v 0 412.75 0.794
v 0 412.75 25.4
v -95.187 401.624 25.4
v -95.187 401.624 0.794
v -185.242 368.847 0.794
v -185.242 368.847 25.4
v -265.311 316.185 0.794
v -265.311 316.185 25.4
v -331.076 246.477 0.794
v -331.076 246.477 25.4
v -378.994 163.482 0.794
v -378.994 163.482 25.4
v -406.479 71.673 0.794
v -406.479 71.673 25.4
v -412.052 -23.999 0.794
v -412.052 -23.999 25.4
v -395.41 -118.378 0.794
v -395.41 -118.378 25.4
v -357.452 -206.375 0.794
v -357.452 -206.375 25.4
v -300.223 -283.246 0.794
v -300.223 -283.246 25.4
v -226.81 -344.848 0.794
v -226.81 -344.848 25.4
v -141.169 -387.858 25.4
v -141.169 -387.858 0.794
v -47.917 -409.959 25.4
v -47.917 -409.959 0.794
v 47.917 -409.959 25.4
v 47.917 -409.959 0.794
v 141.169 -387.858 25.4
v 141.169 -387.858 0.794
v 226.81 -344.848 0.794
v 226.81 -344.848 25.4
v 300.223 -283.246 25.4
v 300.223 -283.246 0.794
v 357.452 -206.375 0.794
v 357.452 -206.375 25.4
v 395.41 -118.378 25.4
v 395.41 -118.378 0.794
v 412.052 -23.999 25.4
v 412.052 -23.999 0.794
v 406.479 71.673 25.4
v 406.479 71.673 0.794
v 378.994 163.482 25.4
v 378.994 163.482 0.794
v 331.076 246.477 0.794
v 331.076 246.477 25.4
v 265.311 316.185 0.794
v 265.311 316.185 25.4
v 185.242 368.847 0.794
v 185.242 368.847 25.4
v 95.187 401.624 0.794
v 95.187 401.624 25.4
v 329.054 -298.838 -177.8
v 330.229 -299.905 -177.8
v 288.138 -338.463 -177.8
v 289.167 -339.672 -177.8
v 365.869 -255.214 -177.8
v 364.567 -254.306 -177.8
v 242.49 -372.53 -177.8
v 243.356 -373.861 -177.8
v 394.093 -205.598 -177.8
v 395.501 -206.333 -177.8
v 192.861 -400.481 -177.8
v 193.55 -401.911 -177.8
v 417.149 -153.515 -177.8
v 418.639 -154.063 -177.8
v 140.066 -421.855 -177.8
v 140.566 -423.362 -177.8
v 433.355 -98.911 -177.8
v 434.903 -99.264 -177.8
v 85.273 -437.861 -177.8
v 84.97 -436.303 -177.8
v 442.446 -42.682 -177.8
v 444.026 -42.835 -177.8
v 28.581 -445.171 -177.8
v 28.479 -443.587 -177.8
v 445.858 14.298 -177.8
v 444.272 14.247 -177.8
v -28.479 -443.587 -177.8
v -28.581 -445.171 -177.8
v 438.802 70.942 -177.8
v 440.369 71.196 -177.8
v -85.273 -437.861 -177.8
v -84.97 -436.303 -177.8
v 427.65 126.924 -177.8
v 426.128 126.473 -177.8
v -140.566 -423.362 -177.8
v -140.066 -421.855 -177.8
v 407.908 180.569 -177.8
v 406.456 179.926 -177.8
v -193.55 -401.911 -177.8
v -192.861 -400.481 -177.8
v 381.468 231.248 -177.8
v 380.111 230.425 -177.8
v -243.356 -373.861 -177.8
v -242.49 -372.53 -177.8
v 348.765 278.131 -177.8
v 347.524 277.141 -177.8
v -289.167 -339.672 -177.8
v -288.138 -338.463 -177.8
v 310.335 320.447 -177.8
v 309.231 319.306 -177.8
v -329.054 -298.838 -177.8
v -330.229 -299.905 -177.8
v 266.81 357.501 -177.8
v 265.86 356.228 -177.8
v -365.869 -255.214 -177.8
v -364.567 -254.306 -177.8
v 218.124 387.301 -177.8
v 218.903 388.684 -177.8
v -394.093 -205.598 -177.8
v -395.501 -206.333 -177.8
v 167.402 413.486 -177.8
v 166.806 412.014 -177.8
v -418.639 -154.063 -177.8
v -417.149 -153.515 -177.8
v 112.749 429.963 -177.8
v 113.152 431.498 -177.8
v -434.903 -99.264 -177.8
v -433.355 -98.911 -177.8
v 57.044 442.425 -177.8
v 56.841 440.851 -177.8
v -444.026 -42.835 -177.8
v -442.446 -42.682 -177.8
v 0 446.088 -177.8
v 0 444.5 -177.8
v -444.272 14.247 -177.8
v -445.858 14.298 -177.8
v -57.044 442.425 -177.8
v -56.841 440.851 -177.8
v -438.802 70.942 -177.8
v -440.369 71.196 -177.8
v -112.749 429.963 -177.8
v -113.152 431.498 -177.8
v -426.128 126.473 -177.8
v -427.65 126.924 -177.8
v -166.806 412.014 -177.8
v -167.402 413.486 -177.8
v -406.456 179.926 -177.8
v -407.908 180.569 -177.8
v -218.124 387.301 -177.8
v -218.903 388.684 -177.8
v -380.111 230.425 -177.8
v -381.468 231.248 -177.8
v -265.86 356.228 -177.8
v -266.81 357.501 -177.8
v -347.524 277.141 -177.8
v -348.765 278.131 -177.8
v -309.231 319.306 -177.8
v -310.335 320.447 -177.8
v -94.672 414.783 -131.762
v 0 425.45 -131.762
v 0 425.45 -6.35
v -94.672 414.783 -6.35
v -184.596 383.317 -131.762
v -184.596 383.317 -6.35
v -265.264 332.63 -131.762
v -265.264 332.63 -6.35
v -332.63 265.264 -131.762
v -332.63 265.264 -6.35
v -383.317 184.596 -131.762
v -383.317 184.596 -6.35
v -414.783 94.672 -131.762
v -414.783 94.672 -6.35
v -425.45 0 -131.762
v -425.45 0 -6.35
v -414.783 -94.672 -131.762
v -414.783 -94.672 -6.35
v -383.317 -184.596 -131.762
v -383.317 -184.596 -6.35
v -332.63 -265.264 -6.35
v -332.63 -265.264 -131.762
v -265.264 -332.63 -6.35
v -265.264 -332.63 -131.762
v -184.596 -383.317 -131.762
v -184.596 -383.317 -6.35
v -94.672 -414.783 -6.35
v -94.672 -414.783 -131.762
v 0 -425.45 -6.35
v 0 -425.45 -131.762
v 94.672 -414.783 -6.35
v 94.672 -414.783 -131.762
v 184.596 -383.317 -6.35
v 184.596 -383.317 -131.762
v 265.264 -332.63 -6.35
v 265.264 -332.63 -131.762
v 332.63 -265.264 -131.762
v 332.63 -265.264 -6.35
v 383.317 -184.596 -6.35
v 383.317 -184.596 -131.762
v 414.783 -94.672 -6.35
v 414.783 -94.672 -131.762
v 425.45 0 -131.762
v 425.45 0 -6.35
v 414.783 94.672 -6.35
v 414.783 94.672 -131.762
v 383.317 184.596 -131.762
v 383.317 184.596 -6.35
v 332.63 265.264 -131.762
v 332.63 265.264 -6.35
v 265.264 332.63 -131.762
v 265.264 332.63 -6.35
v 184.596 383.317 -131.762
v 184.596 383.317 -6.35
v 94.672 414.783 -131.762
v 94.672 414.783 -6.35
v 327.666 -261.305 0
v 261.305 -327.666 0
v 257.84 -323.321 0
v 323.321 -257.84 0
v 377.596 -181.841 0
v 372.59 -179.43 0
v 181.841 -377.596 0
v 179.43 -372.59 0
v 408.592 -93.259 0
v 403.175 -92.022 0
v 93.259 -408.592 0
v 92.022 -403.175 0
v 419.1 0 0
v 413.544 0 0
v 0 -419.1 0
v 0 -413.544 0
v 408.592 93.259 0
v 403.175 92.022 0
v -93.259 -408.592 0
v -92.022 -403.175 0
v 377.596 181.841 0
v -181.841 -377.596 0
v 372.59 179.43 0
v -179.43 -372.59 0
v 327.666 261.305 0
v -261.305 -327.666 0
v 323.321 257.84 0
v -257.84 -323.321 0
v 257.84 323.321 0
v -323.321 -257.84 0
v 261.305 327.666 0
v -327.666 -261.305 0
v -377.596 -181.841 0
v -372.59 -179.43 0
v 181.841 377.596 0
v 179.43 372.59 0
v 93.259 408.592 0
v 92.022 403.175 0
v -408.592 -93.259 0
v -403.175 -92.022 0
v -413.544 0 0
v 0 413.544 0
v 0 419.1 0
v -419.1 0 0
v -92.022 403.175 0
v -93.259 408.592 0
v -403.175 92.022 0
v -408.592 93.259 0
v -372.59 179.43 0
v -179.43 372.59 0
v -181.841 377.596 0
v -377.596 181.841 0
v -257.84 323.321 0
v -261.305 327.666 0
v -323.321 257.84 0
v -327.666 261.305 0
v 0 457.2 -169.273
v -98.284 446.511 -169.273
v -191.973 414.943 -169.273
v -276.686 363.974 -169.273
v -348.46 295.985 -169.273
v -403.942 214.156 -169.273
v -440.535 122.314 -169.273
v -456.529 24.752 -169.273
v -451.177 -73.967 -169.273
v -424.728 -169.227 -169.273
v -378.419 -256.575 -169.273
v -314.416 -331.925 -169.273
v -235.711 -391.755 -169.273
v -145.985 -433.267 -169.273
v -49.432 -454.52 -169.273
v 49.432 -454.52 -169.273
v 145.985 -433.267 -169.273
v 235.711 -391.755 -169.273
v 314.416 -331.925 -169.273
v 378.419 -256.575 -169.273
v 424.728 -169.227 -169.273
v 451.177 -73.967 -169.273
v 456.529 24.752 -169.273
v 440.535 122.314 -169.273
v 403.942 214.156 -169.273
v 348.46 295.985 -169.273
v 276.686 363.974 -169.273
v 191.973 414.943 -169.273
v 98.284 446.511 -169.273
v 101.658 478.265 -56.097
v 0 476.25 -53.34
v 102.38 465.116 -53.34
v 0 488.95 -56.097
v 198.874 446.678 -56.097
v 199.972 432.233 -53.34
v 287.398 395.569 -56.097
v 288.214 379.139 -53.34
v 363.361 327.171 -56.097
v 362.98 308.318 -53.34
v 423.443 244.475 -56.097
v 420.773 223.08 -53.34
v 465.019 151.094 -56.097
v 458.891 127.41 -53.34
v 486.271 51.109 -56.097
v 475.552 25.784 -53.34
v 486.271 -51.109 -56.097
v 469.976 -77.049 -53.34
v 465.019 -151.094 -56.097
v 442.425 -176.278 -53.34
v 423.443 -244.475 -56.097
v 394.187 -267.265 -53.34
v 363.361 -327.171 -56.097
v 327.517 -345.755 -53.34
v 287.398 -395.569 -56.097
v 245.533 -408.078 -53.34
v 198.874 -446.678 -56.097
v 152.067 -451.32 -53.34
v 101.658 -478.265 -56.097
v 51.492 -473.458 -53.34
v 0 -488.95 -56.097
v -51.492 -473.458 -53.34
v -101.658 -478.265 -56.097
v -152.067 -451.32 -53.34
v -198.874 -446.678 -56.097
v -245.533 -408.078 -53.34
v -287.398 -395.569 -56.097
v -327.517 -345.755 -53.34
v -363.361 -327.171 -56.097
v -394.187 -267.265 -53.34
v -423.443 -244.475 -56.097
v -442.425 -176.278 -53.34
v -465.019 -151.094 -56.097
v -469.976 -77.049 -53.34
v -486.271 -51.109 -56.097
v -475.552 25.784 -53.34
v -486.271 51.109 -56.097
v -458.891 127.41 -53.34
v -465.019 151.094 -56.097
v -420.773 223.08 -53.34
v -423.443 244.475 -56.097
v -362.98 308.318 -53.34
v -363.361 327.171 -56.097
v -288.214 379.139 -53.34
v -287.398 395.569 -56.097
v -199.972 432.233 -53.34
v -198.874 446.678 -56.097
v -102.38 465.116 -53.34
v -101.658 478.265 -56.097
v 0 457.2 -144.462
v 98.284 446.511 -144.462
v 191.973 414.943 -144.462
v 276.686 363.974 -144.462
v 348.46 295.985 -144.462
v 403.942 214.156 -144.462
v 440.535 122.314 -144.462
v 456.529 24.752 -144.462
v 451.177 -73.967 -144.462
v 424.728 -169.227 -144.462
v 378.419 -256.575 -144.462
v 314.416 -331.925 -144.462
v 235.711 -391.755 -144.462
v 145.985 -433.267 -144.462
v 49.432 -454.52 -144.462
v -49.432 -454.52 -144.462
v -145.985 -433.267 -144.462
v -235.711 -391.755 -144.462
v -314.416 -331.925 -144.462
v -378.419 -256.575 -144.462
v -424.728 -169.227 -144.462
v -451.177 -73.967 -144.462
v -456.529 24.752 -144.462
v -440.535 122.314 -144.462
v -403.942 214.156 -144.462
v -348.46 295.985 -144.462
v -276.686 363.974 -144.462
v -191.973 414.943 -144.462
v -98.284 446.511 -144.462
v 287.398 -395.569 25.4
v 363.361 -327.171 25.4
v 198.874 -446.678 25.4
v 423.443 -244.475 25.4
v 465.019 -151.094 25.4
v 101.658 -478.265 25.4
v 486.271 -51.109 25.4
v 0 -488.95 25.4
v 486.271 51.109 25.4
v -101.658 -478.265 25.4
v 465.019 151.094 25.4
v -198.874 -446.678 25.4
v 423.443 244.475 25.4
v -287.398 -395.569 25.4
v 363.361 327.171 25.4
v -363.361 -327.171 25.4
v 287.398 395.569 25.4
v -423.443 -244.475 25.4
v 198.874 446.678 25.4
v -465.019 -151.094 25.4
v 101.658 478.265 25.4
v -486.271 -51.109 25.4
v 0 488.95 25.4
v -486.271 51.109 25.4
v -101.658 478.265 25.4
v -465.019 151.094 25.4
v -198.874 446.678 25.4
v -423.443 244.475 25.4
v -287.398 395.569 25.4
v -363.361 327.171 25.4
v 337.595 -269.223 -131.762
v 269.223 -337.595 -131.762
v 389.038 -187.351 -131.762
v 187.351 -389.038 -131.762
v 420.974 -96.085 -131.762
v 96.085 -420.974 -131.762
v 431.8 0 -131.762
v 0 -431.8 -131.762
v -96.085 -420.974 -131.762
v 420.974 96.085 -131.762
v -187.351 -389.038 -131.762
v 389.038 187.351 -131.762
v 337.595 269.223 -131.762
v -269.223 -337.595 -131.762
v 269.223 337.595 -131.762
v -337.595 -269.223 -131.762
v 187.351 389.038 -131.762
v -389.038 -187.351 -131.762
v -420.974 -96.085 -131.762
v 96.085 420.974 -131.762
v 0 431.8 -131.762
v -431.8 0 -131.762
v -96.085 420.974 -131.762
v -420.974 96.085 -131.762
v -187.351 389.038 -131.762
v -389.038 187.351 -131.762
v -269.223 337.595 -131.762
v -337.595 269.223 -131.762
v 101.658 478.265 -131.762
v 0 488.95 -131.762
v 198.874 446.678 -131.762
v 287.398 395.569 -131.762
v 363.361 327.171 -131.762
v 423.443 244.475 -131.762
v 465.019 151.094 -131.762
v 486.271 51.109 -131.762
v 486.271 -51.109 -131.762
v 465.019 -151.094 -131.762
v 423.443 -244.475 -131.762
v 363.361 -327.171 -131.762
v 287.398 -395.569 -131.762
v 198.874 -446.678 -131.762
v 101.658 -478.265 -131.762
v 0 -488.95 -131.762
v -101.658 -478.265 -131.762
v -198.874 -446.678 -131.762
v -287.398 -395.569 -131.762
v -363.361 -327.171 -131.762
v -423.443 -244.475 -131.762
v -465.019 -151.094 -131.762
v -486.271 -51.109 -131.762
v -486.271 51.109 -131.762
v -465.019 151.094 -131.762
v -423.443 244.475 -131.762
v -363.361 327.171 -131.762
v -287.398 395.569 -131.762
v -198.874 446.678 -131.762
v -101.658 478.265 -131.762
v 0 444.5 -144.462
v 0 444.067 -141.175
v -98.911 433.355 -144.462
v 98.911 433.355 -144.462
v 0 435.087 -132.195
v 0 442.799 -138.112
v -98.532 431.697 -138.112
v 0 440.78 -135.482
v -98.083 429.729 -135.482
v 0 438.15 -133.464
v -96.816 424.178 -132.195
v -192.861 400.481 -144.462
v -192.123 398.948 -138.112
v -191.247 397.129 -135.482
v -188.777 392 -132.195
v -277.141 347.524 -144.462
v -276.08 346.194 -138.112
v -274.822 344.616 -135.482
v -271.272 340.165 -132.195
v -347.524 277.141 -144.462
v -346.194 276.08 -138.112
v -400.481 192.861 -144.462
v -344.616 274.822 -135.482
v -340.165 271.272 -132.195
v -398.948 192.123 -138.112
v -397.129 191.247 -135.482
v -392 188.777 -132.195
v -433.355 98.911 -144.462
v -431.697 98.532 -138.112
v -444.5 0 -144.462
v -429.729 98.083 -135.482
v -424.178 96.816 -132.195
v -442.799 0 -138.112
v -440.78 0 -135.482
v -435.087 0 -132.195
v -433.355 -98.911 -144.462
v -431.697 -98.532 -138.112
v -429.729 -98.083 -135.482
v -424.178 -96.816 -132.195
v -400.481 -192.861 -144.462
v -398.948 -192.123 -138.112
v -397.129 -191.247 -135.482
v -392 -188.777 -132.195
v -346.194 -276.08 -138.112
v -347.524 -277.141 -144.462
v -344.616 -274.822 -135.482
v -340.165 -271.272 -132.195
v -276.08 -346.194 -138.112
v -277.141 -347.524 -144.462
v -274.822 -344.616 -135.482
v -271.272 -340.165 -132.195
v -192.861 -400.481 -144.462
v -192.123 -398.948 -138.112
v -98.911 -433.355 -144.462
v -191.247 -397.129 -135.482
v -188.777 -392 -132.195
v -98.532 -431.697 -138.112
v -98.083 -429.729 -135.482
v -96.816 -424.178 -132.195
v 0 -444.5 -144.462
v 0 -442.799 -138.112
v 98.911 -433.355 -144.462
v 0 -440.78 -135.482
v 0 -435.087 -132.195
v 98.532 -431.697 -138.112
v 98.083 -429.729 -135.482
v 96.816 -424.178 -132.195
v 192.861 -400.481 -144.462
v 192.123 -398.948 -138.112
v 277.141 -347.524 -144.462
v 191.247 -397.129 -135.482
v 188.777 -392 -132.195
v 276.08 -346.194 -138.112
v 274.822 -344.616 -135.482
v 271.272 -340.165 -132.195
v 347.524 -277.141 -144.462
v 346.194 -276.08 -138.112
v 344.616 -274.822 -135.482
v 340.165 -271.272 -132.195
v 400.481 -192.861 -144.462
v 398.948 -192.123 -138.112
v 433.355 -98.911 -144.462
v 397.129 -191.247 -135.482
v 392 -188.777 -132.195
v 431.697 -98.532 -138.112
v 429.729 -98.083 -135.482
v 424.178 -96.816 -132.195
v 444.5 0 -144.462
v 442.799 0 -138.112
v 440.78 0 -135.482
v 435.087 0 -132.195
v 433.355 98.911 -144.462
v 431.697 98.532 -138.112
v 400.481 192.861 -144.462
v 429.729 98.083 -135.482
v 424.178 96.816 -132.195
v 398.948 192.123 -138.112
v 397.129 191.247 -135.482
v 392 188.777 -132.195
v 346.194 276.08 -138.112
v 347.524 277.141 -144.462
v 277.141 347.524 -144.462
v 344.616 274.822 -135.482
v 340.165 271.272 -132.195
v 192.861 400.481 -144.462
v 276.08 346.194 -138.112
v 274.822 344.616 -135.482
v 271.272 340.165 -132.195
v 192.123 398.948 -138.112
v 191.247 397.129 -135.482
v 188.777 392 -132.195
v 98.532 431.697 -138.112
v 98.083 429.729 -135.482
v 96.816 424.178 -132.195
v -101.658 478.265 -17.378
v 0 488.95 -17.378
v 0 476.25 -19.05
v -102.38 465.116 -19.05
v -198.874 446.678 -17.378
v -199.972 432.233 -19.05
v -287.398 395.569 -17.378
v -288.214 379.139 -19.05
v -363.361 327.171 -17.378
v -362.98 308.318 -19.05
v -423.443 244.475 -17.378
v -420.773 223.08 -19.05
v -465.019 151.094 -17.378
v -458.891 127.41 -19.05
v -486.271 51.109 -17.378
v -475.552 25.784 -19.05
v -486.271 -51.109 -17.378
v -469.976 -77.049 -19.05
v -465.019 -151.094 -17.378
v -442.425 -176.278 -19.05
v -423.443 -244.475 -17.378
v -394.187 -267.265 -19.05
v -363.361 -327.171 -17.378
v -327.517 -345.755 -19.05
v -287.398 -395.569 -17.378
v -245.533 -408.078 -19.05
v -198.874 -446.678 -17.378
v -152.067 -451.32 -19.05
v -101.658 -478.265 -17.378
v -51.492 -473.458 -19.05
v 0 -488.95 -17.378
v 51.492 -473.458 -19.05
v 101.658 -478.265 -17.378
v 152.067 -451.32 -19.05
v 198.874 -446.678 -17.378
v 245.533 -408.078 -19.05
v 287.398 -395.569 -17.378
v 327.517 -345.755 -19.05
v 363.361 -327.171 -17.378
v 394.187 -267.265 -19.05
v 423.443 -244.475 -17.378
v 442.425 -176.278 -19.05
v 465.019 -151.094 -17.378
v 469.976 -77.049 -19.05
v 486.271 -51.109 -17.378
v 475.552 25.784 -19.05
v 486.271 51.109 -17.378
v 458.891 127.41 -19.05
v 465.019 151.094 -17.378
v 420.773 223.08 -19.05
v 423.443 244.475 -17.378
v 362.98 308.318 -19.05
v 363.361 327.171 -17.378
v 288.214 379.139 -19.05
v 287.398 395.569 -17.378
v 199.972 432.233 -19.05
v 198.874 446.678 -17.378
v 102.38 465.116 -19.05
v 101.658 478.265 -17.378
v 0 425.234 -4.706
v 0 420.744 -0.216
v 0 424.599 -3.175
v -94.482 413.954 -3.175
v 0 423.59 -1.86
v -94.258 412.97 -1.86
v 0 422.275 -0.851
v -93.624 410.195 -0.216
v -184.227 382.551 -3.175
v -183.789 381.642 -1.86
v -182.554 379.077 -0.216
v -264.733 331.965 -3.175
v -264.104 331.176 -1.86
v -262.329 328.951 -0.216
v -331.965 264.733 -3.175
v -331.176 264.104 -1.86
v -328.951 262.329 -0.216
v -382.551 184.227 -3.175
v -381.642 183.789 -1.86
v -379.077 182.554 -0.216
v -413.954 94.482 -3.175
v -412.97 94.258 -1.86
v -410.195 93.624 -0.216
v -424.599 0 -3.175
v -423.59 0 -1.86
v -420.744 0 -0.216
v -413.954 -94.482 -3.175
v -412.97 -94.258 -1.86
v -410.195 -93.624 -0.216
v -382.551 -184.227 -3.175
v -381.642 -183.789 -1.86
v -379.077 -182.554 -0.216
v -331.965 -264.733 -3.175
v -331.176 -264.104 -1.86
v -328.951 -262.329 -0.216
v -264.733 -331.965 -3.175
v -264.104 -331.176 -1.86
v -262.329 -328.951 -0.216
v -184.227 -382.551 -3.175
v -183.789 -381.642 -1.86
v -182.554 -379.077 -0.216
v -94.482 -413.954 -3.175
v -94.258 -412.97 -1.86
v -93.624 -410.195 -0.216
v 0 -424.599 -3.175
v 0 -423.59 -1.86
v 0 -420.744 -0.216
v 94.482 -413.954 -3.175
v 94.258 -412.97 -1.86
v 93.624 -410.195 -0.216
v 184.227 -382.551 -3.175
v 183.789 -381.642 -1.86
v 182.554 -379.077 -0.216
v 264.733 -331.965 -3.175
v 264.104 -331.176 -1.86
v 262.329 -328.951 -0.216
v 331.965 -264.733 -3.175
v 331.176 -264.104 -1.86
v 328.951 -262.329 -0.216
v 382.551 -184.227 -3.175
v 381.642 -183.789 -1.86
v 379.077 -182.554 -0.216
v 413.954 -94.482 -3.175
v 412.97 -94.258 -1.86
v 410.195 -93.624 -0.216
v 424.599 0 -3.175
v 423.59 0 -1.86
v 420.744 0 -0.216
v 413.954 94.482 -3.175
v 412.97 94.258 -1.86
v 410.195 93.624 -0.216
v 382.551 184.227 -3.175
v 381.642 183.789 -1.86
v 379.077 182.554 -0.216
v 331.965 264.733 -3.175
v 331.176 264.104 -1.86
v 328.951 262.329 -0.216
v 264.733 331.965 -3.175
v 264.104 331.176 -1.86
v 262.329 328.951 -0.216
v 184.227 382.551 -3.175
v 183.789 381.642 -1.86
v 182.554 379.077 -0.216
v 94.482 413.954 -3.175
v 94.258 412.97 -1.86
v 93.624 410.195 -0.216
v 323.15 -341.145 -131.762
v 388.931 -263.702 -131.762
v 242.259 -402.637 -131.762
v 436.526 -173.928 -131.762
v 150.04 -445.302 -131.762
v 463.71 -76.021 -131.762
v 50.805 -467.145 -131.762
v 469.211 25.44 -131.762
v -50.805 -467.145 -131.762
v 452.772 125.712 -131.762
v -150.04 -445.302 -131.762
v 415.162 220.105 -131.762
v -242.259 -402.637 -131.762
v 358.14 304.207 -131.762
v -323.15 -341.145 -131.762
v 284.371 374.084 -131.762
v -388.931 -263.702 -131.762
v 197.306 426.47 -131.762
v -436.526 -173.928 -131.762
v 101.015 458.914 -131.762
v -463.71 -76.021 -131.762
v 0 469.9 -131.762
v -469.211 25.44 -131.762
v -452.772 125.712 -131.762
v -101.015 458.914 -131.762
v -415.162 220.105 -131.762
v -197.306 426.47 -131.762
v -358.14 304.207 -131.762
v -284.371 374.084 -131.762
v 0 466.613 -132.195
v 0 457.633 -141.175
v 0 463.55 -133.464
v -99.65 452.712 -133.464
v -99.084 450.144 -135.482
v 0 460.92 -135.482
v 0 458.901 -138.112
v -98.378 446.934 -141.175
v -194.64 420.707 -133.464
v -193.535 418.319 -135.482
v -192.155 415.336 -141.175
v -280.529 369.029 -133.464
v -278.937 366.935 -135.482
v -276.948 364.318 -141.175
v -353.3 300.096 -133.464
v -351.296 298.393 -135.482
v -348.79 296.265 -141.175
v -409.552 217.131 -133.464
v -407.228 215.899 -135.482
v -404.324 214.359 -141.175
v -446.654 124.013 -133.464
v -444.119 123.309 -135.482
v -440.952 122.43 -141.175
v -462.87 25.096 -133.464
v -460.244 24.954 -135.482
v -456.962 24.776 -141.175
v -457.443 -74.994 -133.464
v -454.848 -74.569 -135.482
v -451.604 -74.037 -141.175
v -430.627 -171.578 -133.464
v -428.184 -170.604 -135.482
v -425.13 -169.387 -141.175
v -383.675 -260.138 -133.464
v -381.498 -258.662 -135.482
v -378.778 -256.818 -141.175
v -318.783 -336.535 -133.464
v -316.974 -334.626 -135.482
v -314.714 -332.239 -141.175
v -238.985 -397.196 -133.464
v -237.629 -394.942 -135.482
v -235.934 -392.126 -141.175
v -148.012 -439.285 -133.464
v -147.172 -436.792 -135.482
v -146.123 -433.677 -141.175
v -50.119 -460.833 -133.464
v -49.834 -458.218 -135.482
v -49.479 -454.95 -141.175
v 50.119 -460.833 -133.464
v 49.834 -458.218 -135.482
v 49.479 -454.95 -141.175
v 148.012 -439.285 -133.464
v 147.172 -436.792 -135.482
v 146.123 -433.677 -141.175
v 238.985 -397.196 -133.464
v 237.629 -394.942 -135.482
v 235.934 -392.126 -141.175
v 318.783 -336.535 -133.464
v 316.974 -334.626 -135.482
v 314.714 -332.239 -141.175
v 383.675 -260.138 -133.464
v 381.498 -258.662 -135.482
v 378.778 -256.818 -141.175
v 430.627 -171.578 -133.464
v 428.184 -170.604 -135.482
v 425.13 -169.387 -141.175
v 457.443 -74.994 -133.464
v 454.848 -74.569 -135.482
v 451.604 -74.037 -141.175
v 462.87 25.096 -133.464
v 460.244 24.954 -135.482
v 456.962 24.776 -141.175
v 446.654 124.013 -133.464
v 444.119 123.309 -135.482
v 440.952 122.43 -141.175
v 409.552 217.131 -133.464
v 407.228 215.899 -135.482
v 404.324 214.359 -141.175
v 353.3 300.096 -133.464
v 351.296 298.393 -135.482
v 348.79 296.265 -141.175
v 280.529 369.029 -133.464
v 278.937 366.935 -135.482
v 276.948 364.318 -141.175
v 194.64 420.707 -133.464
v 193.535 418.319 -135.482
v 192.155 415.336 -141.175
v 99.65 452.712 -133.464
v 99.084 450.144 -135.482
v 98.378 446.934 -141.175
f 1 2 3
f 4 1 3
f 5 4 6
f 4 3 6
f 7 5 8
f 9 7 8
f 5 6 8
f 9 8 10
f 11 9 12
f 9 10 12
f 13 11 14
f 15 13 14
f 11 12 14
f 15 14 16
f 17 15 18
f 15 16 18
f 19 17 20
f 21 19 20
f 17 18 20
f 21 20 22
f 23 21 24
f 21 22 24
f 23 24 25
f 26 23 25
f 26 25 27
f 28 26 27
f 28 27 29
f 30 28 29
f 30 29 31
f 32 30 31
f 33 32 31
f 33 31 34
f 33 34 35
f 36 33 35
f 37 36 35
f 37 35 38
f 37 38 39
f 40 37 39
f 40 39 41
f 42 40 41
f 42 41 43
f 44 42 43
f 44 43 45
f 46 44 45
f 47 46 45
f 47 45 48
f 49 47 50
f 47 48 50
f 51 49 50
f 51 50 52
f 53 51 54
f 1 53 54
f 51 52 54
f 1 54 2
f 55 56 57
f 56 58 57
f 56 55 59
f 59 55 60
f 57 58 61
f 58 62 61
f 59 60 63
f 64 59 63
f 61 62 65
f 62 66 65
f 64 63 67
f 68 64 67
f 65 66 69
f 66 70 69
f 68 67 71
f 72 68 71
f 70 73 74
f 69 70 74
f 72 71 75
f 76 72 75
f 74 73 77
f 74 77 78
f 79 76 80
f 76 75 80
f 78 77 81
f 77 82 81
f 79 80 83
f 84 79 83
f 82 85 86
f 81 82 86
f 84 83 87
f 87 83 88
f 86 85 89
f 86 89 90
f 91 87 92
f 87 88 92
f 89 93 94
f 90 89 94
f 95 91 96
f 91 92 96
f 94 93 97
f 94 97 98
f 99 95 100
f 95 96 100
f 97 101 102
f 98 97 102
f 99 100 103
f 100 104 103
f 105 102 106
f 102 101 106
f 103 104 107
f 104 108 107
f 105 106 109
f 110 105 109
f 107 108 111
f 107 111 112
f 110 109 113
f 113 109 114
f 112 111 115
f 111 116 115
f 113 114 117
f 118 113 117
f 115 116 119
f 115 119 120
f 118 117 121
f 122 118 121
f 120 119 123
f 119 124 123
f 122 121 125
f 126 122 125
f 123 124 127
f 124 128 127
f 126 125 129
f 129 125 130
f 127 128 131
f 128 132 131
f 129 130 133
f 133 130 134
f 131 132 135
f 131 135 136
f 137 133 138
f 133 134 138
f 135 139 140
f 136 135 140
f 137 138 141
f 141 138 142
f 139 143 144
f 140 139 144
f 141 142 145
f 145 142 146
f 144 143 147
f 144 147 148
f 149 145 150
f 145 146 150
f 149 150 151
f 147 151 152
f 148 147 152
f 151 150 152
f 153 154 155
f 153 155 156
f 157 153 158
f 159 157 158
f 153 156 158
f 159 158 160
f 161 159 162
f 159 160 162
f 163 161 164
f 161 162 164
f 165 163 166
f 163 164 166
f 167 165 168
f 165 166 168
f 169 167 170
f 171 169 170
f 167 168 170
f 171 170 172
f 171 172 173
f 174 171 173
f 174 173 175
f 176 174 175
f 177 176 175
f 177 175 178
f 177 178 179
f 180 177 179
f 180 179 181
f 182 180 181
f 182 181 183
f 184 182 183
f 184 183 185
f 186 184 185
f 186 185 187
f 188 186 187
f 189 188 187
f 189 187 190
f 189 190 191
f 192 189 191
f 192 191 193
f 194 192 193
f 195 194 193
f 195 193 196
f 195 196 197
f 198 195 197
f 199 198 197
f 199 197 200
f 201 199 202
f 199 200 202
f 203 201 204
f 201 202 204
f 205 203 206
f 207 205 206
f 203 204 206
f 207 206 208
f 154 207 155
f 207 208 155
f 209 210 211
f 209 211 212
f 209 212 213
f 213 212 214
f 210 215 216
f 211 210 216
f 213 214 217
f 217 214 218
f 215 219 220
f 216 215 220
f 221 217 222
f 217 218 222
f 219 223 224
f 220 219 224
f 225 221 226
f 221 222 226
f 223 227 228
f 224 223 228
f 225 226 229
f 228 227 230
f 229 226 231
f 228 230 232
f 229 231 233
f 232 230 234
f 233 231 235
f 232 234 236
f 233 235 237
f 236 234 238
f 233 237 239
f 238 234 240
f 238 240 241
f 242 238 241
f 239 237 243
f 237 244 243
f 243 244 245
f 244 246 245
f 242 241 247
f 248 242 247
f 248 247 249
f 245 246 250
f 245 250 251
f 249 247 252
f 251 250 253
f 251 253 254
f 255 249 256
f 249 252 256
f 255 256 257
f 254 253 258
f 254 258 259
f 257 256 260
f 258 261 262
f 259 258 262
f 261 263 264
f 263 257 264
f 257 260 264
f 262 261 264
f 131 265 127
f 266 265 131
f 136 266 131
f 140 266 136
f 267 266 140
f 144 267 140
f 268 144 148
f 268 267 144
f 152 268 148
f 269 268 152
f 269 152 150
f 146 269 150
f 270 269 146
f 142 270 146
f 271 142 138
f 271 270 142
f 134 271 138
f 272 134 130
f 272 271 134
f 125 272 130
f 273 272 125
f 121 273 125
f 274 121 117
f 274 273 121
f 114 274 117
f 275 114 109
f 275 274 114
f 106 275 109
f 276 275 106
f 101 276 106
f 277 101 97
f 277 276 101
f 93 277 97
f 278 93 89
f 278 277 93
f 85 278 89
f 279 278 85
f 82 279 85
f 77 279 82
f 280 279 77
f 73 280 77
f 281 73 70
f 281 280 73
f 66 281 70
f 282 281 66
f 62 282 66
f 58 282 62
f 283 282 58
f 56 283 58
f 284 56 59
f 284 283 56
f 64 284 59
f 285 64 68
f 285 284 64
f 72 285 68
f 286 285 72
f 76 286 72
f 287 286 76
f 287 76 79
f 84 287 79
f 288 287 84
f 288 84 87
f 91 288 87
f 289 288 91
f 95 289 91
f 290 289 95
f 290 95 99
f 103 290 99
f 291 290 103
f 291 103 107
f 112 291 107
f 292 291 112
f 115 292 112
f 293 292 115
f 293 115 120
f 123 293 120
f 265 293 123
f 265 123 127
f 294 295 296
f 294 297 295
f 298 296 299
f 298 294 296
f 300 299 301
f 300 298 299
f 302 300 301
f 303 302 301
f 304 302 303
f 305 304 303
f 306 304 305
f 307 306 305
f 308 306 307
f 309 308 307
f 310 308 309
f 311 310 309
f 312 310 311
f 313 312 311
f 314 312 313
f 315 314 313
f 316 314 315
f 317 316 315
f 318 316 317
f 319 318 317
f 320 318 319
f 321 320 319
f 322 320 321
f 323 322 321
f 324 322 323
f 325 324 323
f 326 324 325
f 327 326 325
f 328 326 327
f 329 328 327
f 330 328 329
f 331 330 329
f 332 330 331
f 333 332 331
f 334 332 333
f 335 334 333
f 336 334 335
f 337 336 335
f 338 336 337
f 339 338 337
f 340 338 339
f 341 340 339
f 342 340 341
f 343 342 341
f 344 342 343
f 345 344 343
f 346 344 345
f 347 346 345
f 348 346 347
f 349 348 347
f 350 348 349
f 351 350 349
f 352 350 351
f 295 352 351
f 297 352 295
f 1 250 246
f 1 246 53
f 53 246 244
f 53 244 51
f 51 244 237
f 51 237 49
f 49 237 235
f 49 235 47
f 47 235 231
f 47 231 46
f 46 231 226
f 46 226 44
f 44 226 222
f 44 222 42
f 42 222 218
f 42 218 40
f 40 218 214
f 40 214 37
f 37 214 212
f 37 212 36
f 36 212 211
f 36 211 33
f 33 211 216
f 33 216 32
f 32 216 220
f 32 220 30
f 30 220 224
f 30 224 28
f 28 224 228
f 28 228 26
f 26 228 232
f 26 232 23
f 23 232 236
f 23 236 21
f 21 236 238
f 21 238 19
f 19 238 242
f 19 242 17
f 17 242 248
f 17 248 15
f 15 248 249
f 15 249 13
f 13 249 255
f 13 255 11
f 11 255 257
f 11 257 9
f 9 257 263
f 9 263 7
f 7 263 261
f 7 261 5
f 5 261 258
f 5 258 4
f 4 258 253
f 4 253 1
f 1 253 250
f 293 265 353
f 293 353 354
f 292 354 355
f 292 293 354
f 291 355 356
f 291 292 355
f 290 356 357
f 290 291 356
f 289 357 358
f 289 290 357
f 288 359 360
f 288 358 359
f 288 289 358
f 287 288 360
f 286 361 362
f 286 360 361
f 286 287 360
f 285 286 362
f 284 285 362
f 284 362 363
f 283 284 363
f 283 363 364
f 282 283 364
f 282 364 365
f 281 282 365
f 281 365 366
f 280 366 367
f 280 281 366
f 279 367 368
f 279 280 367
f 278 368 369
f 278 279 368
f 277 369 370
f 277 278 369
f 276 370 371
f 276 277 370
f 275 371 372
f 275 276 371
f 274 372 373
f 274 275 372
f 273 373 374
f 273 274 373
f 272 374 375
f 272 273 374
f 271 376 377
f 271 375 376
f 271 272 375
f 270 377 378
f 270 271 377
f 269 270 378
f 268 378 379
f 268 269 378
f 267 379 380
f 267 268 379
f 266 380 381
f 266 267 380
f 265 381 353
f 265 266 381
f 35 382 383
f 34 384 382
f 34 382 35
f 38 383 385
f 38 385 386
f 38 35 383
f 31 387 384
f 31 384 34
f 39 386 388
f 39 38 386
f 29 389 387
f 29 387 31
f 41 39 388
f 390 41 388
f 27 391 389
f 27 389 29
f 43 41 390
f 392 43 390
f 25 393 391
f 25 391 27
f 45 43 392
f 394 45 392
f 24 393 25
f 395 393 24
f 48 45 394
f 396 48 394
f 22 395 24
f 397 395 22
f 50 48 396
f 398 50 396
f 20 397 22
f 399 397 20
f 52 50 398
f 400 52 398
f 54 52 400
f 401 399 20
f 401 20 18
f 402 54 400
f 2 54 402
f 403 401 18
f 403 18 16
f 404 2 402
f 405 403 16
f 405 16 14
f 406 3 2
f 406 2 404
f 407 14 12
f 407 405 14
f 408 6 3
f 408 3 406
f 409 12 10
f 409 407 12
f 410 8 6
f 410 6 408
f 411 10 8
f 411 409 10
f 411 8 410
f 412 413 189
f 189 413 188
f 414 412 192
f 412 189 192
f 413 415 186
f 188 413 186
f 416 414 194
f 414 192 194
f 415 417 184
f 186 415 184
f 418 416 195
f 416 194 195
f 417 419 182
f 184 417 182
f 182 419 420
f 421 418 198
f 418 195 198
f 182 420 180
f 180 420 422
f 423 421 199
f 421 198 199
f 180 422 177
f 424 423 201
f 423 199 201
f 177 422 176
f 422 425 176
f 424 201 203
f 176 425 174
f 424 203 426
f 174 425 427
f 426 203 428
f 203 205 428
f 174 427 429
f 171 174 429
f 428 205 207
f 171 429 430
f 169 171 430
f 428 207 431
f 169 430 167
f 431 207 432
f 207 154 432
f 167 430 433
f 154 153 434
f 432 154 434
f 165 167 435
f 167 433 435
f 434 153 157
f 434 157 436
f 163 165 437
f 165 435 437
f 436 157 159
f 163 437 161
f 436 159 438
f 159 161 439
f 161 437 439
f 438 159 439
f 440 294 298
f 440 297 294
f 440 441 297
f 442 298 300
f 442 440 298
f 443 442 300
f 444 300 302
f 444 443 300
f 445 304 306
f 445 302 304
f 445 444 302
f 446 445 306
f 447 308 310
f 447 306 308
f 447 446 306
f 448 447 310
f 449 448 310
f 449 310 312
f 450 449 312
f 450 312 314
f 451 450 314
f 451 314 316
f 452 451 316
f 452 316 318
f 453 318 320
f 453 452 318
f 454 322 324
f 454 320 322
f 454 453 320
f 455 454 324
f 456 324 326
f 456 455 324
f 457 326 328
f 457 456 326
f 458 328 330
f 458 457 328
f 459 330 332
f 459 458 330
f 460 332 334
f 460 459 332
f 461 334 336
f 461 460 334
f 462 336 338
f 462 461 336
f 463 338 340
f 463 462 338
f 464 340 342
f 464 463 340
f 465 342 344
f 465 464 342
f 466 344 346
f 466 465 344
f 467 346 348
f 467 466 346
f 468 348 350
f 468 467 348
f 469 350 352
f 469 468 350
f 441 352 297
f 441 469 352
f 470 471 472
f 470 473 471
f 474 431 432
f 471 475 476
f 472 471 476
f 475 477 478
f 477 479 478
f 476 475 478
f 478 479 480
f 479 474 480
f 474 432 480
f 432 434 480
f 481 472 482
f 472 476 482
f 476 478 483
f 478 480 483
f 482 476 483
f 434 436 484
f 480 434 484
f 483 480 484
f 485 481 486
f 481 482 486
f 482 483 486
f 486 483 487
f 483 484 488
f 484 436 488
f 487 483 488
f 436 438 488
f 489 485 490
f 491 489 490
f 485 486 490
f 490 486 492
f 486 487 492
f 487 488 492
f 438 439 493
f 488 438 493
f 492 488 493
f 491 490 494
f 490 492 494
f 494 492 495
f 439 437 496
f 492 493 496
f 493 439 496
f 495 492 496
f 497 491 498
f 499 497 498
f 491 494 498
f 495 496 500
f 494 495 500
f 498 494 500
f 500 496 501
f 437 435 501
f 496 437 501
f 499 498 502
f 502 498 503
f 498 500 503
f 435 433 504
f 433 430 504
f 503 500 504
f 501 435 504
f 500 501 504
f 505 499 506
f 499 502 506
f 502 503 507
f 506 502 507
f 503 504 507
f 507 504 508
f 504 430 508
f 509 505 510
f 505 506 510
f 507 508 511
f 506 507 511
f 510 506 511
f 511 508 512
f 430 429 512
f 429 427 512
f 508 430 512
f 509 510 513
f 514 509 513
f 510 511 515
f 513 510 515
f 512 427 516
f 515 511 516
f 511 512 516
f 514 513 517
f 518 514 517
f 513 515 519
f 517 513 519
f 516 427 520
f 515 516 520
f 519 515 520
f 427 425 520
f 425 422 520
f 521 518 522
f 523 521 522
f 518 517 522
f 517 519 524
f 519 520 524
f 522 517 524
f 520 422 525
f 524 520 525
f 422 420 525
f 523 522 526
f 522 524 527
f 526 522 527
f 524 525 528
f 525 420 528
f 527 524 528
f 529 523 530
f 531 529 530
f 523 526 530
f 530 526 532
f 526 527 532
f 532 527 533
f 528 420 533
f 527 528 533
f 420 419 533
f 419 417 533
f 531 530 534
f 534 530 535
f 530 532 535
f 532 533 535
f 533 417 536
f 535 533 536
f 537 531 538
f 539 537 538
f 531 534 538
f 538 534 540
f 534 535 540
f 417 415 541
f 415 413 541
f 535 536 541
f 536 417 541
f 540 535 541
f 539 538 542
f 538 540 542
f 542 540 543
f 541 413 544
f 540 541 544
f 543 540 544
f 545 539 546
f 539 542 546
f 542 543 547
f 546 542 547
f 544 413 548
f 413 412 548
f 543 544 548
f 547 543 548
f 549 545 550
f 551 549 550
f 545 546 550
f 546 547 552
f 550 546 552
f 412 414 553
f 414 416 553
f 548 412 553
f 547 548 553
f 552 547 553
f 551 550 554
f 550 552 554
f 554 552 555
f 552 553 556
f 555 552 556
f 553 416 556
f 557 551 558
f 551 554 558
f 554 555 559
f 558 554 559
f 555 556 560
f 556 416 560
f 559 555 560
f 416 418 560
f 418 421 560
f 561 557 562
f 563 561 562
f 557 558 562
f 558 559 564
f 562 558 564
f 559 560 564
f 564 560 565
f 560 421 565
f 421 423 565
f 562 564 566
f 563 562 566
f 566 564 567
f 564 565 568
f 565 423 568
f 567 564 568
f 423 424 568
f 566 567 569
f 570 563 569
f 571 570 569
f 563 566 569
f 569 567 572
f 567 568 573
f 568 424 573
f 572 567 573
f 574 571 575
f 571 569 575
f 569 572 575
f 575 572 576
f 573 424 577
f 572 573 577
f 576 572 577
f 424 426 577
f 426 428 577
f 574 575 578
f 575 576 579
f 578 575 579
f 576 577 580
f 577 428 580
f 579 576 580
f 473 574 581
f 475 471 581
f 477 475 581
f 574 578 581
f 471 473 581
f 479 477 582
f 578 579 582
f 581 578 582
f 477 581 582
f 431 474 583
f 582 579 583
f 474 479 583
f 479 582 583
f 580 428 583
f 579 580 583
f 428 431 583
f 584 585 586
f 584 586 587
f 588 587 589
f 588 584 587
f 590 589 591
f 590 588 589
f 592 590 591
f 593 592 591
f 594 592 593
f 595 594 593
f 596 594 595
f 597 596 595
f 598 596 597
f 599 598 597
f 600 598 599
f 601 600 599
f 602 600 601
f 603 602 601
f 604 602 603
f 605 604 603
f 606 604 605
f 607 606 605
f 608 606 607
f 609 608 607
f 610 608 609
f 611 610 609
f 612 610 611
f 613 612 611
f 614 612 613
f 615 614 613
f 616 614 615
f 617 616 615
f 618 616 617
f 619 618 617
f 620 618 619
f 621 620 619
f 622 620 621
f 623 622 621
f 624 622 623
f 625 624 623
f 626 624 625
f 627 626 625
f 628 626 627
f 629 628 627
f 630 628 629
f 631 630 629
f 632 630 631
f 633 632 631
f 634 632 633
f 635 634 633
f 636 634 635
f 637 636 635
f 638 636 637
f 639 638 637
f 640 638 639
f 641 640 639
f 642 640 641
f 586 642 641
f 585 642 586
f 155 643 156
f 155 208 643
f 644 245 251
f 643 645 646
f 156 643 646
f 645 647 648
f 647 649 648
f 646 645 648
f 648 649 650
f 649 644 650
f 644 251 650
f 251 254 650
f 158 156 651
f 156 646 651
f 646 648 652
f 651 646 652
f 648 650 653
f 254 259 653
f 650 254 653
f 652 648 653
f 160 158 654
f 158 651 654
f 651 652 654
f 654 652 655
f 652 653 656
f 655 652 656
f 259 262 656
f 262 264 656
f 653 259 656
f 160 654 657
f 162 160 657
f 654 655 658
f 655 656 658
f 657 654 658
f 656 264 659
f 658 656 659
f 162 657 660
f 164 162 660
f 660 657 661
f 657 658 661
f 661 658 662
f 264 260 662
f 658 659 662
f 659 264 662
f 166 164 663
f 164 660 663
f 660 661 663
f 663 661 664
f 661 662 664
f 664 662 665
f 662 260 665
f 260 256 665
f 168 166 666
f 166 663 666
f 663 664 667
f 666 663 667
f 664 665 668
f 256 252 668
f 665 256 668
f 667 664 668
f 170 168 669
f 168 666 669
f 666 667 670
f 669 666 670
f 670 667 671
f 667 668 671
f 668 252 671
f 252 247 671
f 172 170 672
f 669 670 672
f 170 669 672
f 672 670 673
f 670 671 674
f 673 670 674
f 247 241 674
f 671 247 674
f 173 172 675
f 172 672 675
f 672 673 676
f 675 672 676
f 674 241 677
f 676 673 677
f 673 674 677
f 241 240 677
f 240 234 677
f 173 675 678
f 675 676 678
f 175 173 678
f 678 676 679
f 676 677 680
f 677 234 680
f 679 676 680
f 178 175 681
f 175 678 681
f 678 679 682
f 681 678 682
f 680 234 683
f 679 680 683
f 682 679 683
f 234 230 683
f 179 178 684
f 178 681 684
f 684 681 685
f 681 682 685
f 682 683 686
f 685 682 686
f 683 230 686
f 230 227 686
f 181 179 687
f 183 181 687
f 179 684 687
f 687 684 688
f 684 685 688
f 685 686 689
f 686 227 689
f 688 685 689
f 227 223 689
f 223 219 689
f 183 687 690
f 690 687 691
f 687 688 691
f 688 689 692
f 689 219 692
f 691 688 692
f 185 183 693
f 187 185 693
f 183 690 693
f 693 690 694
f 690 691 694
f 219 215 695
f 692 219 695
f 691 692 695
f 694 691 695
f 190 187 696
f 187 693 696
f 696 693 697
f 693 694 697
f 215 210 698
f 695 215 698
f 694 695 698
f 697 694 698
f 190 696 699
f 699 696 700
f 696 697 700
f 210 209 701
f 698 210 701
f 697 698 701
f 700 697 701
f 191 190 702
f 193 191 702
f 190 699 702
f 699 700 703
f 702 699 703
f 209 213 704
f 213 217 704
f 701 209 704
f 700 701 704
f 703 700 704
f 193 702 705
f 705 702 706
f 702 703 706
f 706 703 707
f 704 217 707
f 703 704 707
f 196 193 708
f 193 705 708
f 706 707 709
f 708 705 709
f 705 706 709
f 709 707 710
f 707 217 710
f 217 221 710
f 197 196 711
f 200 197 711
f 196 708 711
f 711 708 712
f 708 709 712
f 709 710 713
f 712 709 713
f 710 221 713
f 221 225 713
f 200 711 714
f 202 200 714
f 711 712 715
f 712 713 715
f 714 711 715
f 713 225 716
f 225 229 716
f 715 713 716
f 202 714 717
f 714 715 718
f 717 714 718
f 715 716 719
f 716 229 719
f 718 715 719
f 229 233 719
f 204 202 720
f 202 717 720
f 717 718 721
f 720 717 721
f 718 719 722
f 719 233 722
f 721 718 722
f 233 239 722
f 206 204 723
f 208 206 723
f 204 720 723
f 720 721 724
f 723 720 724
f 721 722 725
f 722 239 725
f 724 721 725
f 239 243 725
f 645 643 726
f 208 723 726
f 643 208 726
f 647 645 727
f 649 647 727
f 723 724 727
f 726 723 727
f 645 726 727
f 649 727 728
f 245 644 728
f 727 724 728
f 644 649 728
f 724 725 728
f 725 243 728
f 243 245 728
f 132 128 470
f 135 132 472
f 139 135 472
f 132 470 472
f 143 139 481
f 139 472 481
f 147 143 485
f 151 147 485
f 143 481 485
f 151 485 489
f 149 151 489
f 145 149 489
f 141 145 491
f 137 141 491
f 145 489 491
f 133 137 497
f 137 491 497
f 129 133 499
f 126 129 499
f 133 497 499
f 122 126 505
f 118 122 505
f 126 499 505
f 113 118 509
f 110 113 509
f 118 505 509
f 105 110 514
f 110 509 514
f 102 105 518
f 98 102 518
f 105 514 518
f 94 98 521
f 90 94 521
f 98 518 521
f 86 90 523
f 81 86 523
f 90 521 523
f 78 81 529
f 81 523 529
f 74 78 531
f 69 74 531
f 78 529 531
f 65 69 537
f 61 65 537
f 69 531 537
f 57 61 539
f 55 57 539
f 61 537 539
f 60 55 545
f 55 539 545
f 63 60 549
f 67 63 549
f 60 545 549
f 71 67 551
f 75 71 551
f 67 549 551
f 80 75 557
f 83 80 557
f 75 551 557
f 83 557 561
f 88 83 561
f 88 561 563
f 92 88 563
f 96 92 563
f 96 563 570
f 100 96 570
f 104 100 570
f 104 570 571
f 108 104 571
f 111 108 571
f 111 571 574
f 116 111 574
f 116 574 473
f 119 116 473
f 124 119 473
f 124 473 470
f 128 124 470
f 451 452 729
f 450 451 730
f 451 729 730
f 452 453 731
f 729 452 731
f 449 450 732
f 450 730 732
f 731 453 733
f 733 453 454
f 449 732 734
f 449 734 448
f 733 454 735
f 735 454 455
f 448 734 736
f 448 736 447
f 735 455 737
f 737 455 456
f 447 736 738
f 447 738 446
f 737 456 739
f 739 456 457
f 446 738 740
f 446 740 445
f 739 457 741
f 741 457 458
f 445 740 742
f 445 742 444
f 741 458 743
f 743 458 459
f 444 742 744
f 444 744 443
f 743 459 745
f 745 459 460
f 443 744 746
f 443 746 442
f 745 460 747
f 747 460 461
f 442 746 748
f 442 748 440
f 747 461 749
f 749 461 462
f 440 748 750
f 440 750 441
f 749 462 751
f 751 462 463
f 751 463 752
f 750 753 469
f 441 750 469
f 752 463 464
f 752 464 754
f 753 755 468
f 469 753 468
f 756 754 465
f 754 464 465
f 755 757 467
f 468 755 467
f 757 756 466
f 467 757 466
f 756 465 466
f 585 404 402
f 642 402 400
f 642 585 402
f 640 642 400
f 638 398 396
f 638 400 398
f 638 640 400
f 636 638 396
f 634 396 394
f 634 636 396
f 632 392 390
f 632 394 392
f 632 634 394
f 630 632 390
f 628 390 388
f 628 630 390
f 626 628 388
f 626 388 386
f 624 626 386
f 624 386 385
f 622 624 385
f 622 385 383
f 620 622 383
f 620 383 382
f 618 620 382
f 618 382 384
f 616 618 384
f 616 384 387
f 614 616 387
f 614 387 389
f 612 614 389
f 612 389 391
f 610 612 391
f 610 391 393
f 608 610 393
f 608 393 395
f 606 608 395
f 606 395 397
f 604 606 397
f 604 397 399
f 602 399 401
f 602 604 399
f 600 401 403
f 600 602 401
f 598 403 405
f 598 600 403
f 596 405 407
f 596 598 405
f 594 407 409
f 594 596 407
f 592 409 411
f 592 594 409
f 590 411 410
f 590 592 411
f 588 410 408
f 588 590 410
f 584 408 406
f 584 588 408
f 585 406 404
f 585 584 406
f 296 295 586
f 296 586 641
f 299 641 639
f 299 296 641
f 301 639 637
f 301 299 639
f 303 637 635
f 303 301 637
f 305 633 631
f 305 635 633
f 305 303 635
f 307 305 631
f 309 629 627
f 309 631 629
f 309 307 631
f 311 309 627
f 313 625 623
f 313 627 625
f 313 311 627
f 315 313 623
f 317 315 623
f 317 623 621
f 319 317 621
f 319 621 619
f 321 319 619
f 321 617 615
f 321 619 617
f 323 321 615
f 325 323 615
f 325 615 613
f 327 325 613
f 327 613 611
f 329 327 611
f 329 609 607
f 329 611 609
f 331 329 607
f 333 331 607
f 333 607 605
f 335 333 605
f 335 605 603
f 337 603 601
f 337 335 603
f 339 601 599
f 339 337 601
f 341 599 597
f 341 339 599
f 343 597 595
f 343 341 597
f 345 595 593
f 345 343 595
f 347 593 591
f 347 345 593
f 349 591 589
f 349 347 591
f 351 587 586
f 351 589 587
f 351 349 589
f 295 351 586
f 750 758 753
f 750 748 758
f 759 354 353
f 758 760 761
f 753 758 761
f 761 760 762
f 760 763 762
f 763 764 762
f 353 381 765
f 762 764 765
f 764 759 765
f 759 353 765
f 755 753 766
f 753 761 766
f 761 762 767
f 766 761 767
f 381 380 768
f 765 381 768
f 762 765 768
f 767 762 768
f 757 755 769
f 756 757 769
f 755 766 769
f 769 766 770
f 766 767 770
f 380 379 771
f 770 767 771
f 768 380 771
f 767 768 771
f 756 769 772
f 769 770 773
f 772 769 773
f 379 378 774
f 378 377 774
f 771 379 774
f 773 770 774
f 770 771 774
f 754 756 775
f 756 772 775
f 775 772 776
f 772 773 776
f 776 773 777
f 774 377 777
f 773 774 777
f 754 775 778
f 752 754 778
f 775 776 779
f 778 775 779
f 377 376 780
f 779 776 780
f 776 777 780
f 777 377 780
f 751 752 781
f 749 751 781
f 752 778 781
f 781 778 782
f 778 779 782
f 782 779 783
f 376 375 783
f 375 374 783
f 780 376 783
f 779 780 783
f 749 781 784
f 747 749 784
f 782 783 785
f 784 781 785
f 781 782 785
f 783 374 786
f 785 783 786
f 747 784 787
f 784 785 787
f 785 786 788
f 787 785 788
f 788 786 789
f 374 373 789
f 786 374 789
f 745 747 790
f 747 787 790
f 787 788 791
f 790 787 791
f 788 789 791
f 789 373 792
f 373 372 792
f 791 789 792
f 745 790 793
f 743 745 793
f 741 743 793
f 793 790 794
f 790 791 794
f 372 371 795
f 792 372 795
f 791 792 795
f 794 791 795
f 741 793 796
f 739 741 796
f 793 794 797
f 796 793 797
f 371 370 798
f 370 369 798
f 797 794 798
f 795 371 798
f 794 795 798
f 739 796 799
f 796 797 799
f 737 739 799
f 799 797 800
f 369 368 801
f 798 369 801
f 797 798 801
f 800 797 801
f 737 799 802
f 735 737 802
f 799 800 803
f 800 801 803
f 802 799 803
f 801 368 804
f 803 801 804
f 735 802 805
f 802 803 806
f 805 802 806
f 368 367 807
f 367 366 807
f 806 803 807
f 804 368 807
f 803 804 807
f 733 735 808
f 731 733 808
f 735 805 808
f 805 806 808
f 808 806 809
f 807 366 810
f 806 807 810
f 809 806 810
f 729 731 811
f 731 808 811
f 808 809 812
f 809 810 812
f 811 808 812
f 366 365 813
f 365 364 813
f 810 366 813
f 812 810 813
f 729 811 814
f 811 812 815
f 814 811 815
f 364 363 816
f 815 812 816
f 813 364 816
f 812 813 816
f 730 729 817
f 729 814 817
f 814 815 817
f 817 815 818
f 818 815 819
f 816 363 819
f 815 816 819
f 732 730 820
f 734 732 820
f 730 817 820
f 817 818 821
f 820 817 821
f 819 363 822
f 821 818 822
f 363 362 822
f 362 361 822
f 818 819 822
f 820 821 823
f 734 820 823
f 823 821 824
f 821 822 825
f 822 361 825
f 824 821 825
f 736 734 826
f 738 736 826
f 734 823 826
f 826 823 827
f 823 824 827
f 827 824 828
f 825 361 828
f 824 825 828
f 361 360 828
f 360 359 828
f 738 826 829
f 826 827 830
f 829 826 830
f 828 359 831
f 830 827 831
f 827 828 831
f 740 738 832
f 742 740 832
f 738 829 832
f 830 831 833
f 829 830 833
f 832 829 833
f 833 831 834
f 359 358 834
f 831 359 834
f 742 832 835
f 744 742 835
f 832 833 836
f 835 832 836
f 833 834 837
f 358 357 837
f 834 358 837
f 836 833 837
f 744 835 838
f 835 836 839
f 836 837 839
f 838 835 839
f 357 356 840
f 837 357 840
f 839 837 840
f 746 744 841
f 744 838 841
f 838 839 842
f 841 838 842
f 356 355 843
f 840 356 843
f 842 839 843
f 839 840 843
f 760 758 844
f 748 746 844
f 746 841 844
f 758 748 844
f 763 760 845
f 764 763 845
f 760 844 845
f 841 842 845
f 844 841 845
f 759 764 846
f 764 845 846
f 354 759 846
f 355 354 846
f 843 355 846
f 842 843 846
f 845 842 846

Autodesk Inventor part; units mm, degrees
ref_plane "YZ Plane" through (0, 0, 0) normal (1, 0, 0) x (0, 1, 0)
ref_plane "XZ Plane" through (0, 0, 0) normal (0, 1, 0) x (-1, 0, 0)
ref_plane "XY Plane" through (0, 0, 0) normal (0, 0, 1) x (1, 0, 0)
sketch "Sketch1" plane through (0, 0, 0) normal (1, 0, 0) x (0, 1, 0)
  line L0 (412.75, 0) -> (412.75, 25.4)
  line L1 (412.75, 25.4) -> (488.95, 25.4)
  line L2 (488.95, 25.4) -> (488.95, -17.378)
  line L3 (488.95, -17.378) -> (476.25, -19.05)
  line L4 (476.25, -19.05) -> (476.25, -53.34)
  line L5 (476.25, -53.34) -> (488.95, -56.0974)
  line L6 (488.95, -56.0974) -> (488.95, -131.7625)
  line L7 (0, -218.44) -> (0, 66.04) projected
  line L8 (457.2, -144.4625) -> (457.2, -169.2731)
  line L9 (457.2, -169.2731) -> (446.0875, -177.8)
  line L10 (446.0875, -177.8) -> (444.5, -177.8)
  line L11 (444.5, -177.8) -> (444.5, -144.4625)
  arc A0 (425.45, -6.35) -> (419.1, 0) centre (419.1, -6.35) ccw
  line L12 (419.1, 0) -> (412.75, 0)
  arc A1 (469.9, -131.7625) -> (457.2, -144.4625) centre (469.9, -144.4625) ccw
  line L13 (425.45, -131.7625) -> (431.8, -131.7625)
  arc A2 (444.5, -144.4625) -> (431.8, -131.7625) centre (431.8, -144.4625) ccw
  line L14 (425.45, -131.7625) -> (425.45, -6.35)
  line L15 (488.95, -131.7625) -> (469.9, -131.7625)
  point P0 (0, 0)
  dimension "d0" = 412.75
  dimension "d5" = 25.4
  dimension "d13" = 476.25
  dimension "d14" = 488.95
  dimension "d16" = 44.45
  dimension "d17" = 34.29
  dimension "d18" = 7.5
  dimension "d19" = 12.25
  dimension "d32" = 457.2
  dimension "d33" = 11.1125
  dimension "d35" = 1.5875
  dimension "d36" = 6.35
  dimension "d38" = 203.2
  dimension "d44" = 12.7
  dimension "d46" = 37.5
  dimension "d47" = 12.7
  dimension "d48" = 425.45
  dimension "d49" = 157.1625
revolve "Revolution1" add sketch "Sketch1" angle 360 about axis through (0, 0, -10) along (0, 0, 1)
chamfer "Chamfer2" distance 0.7937 angle 45 1 edges at (0, -412.75, 0)
equation "\"d47\" = d44"
properties part number "A1-19027-100-03 36in Type B victaulic ring" material "Steel, Mild"
